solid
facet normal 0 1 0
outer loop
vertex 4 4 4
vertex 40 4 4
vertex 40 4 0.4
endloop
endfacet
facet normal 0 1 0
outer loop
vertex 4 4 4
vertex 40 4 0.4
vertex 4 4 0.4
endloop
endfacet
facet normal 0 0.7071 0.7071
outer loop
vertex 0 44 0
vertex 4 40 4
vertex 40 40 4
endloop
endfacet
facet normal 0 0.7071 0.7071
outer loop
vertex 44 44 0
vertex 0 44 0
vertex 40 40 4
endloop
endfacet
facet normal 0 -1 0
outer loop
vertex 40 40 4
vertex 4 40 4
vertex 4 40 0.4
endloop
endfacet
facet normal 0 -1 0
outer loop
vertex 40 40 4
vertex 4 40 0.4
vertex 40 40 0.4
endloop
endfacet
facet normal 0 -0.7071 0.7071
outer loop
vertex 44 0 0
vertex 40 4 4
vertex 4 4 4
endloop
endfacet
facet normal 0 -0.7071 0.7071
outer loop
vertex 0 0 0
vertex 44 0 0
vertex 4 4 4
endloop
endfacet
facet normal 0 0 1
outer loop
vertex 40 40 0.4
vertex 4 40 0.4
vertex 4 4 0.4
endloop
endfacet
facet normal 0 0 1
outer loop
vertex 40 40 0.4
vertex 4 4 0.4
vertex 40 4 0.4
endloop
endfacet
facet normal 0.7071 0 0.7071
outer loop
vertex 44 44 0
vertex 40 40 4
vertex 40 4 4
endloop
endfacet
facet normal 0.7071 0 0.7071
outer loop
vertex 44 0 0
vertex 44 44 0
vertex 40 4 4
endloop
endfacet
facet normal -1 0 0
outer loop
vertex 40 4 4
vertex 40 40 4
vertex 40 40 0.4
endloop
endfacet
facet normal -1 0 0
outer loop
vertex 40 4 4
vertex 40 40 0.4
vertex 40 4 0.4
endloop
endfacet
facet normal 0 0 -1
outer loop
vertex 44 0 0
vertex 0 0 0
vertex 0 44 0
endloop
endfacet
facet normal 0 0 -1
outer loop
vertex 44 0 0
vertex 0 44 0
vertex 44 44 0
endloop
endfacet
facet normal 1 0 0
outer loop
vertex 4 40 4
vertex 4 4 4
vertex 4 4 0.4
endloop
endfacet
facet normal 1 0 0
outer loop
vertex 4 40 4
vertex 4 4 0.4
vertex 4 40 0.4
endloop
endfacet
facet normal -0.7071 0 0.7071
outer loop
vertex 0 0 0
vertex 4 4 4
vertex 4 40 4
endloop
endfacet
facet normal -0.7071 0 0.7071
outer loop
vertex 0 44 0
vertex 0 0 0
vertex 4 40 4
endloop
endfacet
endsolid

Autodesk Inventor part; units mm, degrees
ref_plane "YZ Plane" through (0, 0, 0) normal (1, 0, 0) x (0, 1, 0)
ref_plane "XZ Plane" through (0, 0, 0) normal (0, 1, 0) x (-1, 0, 0)
ref_plane "XY Plane" through (0, 0, 0) normal (0, 0, 1) x (1, 0, 0)
sketch "Sketch1" plane through (0, 0, 0) normal (0, 0, 1) x (1, 0, 0)
  line L0 (0, 0) -> (44, 0)
  line L1 (44, 0) -> (44, 44)
  line L2 (44, 44) -> (0, 44)
  line L3 (0, 44) -> (0, 0)
  dimension "d0" = 44
  dimension "d1" = 44
extrude "Extrusion1" add sketch "Sketch1" along normal blind 4
chamfer "Chamfer1" distance 4 angle 45 4 edges at (22, 44, 4) (44, 22, 4) (22, 0, 4) (0, 22, 4)
sketch "Sketch2" plane through (0, 0, 4) normal (0, 0, 1) x (1, 0, 0)
  line L0 (40, 4) -> (4, 4) projected
  line L1 (40, 40) -> (40, 4) projected
  line L2 (4, 40) -> (40, 40) projected
  line L3 (4, 4) -> (4, 40) projected
  point P0 (0, 0)
extrude "Extrusion2" cut sketch "Sketch2" against normal blind 3.6
properties part number "clear-square-hollow"
